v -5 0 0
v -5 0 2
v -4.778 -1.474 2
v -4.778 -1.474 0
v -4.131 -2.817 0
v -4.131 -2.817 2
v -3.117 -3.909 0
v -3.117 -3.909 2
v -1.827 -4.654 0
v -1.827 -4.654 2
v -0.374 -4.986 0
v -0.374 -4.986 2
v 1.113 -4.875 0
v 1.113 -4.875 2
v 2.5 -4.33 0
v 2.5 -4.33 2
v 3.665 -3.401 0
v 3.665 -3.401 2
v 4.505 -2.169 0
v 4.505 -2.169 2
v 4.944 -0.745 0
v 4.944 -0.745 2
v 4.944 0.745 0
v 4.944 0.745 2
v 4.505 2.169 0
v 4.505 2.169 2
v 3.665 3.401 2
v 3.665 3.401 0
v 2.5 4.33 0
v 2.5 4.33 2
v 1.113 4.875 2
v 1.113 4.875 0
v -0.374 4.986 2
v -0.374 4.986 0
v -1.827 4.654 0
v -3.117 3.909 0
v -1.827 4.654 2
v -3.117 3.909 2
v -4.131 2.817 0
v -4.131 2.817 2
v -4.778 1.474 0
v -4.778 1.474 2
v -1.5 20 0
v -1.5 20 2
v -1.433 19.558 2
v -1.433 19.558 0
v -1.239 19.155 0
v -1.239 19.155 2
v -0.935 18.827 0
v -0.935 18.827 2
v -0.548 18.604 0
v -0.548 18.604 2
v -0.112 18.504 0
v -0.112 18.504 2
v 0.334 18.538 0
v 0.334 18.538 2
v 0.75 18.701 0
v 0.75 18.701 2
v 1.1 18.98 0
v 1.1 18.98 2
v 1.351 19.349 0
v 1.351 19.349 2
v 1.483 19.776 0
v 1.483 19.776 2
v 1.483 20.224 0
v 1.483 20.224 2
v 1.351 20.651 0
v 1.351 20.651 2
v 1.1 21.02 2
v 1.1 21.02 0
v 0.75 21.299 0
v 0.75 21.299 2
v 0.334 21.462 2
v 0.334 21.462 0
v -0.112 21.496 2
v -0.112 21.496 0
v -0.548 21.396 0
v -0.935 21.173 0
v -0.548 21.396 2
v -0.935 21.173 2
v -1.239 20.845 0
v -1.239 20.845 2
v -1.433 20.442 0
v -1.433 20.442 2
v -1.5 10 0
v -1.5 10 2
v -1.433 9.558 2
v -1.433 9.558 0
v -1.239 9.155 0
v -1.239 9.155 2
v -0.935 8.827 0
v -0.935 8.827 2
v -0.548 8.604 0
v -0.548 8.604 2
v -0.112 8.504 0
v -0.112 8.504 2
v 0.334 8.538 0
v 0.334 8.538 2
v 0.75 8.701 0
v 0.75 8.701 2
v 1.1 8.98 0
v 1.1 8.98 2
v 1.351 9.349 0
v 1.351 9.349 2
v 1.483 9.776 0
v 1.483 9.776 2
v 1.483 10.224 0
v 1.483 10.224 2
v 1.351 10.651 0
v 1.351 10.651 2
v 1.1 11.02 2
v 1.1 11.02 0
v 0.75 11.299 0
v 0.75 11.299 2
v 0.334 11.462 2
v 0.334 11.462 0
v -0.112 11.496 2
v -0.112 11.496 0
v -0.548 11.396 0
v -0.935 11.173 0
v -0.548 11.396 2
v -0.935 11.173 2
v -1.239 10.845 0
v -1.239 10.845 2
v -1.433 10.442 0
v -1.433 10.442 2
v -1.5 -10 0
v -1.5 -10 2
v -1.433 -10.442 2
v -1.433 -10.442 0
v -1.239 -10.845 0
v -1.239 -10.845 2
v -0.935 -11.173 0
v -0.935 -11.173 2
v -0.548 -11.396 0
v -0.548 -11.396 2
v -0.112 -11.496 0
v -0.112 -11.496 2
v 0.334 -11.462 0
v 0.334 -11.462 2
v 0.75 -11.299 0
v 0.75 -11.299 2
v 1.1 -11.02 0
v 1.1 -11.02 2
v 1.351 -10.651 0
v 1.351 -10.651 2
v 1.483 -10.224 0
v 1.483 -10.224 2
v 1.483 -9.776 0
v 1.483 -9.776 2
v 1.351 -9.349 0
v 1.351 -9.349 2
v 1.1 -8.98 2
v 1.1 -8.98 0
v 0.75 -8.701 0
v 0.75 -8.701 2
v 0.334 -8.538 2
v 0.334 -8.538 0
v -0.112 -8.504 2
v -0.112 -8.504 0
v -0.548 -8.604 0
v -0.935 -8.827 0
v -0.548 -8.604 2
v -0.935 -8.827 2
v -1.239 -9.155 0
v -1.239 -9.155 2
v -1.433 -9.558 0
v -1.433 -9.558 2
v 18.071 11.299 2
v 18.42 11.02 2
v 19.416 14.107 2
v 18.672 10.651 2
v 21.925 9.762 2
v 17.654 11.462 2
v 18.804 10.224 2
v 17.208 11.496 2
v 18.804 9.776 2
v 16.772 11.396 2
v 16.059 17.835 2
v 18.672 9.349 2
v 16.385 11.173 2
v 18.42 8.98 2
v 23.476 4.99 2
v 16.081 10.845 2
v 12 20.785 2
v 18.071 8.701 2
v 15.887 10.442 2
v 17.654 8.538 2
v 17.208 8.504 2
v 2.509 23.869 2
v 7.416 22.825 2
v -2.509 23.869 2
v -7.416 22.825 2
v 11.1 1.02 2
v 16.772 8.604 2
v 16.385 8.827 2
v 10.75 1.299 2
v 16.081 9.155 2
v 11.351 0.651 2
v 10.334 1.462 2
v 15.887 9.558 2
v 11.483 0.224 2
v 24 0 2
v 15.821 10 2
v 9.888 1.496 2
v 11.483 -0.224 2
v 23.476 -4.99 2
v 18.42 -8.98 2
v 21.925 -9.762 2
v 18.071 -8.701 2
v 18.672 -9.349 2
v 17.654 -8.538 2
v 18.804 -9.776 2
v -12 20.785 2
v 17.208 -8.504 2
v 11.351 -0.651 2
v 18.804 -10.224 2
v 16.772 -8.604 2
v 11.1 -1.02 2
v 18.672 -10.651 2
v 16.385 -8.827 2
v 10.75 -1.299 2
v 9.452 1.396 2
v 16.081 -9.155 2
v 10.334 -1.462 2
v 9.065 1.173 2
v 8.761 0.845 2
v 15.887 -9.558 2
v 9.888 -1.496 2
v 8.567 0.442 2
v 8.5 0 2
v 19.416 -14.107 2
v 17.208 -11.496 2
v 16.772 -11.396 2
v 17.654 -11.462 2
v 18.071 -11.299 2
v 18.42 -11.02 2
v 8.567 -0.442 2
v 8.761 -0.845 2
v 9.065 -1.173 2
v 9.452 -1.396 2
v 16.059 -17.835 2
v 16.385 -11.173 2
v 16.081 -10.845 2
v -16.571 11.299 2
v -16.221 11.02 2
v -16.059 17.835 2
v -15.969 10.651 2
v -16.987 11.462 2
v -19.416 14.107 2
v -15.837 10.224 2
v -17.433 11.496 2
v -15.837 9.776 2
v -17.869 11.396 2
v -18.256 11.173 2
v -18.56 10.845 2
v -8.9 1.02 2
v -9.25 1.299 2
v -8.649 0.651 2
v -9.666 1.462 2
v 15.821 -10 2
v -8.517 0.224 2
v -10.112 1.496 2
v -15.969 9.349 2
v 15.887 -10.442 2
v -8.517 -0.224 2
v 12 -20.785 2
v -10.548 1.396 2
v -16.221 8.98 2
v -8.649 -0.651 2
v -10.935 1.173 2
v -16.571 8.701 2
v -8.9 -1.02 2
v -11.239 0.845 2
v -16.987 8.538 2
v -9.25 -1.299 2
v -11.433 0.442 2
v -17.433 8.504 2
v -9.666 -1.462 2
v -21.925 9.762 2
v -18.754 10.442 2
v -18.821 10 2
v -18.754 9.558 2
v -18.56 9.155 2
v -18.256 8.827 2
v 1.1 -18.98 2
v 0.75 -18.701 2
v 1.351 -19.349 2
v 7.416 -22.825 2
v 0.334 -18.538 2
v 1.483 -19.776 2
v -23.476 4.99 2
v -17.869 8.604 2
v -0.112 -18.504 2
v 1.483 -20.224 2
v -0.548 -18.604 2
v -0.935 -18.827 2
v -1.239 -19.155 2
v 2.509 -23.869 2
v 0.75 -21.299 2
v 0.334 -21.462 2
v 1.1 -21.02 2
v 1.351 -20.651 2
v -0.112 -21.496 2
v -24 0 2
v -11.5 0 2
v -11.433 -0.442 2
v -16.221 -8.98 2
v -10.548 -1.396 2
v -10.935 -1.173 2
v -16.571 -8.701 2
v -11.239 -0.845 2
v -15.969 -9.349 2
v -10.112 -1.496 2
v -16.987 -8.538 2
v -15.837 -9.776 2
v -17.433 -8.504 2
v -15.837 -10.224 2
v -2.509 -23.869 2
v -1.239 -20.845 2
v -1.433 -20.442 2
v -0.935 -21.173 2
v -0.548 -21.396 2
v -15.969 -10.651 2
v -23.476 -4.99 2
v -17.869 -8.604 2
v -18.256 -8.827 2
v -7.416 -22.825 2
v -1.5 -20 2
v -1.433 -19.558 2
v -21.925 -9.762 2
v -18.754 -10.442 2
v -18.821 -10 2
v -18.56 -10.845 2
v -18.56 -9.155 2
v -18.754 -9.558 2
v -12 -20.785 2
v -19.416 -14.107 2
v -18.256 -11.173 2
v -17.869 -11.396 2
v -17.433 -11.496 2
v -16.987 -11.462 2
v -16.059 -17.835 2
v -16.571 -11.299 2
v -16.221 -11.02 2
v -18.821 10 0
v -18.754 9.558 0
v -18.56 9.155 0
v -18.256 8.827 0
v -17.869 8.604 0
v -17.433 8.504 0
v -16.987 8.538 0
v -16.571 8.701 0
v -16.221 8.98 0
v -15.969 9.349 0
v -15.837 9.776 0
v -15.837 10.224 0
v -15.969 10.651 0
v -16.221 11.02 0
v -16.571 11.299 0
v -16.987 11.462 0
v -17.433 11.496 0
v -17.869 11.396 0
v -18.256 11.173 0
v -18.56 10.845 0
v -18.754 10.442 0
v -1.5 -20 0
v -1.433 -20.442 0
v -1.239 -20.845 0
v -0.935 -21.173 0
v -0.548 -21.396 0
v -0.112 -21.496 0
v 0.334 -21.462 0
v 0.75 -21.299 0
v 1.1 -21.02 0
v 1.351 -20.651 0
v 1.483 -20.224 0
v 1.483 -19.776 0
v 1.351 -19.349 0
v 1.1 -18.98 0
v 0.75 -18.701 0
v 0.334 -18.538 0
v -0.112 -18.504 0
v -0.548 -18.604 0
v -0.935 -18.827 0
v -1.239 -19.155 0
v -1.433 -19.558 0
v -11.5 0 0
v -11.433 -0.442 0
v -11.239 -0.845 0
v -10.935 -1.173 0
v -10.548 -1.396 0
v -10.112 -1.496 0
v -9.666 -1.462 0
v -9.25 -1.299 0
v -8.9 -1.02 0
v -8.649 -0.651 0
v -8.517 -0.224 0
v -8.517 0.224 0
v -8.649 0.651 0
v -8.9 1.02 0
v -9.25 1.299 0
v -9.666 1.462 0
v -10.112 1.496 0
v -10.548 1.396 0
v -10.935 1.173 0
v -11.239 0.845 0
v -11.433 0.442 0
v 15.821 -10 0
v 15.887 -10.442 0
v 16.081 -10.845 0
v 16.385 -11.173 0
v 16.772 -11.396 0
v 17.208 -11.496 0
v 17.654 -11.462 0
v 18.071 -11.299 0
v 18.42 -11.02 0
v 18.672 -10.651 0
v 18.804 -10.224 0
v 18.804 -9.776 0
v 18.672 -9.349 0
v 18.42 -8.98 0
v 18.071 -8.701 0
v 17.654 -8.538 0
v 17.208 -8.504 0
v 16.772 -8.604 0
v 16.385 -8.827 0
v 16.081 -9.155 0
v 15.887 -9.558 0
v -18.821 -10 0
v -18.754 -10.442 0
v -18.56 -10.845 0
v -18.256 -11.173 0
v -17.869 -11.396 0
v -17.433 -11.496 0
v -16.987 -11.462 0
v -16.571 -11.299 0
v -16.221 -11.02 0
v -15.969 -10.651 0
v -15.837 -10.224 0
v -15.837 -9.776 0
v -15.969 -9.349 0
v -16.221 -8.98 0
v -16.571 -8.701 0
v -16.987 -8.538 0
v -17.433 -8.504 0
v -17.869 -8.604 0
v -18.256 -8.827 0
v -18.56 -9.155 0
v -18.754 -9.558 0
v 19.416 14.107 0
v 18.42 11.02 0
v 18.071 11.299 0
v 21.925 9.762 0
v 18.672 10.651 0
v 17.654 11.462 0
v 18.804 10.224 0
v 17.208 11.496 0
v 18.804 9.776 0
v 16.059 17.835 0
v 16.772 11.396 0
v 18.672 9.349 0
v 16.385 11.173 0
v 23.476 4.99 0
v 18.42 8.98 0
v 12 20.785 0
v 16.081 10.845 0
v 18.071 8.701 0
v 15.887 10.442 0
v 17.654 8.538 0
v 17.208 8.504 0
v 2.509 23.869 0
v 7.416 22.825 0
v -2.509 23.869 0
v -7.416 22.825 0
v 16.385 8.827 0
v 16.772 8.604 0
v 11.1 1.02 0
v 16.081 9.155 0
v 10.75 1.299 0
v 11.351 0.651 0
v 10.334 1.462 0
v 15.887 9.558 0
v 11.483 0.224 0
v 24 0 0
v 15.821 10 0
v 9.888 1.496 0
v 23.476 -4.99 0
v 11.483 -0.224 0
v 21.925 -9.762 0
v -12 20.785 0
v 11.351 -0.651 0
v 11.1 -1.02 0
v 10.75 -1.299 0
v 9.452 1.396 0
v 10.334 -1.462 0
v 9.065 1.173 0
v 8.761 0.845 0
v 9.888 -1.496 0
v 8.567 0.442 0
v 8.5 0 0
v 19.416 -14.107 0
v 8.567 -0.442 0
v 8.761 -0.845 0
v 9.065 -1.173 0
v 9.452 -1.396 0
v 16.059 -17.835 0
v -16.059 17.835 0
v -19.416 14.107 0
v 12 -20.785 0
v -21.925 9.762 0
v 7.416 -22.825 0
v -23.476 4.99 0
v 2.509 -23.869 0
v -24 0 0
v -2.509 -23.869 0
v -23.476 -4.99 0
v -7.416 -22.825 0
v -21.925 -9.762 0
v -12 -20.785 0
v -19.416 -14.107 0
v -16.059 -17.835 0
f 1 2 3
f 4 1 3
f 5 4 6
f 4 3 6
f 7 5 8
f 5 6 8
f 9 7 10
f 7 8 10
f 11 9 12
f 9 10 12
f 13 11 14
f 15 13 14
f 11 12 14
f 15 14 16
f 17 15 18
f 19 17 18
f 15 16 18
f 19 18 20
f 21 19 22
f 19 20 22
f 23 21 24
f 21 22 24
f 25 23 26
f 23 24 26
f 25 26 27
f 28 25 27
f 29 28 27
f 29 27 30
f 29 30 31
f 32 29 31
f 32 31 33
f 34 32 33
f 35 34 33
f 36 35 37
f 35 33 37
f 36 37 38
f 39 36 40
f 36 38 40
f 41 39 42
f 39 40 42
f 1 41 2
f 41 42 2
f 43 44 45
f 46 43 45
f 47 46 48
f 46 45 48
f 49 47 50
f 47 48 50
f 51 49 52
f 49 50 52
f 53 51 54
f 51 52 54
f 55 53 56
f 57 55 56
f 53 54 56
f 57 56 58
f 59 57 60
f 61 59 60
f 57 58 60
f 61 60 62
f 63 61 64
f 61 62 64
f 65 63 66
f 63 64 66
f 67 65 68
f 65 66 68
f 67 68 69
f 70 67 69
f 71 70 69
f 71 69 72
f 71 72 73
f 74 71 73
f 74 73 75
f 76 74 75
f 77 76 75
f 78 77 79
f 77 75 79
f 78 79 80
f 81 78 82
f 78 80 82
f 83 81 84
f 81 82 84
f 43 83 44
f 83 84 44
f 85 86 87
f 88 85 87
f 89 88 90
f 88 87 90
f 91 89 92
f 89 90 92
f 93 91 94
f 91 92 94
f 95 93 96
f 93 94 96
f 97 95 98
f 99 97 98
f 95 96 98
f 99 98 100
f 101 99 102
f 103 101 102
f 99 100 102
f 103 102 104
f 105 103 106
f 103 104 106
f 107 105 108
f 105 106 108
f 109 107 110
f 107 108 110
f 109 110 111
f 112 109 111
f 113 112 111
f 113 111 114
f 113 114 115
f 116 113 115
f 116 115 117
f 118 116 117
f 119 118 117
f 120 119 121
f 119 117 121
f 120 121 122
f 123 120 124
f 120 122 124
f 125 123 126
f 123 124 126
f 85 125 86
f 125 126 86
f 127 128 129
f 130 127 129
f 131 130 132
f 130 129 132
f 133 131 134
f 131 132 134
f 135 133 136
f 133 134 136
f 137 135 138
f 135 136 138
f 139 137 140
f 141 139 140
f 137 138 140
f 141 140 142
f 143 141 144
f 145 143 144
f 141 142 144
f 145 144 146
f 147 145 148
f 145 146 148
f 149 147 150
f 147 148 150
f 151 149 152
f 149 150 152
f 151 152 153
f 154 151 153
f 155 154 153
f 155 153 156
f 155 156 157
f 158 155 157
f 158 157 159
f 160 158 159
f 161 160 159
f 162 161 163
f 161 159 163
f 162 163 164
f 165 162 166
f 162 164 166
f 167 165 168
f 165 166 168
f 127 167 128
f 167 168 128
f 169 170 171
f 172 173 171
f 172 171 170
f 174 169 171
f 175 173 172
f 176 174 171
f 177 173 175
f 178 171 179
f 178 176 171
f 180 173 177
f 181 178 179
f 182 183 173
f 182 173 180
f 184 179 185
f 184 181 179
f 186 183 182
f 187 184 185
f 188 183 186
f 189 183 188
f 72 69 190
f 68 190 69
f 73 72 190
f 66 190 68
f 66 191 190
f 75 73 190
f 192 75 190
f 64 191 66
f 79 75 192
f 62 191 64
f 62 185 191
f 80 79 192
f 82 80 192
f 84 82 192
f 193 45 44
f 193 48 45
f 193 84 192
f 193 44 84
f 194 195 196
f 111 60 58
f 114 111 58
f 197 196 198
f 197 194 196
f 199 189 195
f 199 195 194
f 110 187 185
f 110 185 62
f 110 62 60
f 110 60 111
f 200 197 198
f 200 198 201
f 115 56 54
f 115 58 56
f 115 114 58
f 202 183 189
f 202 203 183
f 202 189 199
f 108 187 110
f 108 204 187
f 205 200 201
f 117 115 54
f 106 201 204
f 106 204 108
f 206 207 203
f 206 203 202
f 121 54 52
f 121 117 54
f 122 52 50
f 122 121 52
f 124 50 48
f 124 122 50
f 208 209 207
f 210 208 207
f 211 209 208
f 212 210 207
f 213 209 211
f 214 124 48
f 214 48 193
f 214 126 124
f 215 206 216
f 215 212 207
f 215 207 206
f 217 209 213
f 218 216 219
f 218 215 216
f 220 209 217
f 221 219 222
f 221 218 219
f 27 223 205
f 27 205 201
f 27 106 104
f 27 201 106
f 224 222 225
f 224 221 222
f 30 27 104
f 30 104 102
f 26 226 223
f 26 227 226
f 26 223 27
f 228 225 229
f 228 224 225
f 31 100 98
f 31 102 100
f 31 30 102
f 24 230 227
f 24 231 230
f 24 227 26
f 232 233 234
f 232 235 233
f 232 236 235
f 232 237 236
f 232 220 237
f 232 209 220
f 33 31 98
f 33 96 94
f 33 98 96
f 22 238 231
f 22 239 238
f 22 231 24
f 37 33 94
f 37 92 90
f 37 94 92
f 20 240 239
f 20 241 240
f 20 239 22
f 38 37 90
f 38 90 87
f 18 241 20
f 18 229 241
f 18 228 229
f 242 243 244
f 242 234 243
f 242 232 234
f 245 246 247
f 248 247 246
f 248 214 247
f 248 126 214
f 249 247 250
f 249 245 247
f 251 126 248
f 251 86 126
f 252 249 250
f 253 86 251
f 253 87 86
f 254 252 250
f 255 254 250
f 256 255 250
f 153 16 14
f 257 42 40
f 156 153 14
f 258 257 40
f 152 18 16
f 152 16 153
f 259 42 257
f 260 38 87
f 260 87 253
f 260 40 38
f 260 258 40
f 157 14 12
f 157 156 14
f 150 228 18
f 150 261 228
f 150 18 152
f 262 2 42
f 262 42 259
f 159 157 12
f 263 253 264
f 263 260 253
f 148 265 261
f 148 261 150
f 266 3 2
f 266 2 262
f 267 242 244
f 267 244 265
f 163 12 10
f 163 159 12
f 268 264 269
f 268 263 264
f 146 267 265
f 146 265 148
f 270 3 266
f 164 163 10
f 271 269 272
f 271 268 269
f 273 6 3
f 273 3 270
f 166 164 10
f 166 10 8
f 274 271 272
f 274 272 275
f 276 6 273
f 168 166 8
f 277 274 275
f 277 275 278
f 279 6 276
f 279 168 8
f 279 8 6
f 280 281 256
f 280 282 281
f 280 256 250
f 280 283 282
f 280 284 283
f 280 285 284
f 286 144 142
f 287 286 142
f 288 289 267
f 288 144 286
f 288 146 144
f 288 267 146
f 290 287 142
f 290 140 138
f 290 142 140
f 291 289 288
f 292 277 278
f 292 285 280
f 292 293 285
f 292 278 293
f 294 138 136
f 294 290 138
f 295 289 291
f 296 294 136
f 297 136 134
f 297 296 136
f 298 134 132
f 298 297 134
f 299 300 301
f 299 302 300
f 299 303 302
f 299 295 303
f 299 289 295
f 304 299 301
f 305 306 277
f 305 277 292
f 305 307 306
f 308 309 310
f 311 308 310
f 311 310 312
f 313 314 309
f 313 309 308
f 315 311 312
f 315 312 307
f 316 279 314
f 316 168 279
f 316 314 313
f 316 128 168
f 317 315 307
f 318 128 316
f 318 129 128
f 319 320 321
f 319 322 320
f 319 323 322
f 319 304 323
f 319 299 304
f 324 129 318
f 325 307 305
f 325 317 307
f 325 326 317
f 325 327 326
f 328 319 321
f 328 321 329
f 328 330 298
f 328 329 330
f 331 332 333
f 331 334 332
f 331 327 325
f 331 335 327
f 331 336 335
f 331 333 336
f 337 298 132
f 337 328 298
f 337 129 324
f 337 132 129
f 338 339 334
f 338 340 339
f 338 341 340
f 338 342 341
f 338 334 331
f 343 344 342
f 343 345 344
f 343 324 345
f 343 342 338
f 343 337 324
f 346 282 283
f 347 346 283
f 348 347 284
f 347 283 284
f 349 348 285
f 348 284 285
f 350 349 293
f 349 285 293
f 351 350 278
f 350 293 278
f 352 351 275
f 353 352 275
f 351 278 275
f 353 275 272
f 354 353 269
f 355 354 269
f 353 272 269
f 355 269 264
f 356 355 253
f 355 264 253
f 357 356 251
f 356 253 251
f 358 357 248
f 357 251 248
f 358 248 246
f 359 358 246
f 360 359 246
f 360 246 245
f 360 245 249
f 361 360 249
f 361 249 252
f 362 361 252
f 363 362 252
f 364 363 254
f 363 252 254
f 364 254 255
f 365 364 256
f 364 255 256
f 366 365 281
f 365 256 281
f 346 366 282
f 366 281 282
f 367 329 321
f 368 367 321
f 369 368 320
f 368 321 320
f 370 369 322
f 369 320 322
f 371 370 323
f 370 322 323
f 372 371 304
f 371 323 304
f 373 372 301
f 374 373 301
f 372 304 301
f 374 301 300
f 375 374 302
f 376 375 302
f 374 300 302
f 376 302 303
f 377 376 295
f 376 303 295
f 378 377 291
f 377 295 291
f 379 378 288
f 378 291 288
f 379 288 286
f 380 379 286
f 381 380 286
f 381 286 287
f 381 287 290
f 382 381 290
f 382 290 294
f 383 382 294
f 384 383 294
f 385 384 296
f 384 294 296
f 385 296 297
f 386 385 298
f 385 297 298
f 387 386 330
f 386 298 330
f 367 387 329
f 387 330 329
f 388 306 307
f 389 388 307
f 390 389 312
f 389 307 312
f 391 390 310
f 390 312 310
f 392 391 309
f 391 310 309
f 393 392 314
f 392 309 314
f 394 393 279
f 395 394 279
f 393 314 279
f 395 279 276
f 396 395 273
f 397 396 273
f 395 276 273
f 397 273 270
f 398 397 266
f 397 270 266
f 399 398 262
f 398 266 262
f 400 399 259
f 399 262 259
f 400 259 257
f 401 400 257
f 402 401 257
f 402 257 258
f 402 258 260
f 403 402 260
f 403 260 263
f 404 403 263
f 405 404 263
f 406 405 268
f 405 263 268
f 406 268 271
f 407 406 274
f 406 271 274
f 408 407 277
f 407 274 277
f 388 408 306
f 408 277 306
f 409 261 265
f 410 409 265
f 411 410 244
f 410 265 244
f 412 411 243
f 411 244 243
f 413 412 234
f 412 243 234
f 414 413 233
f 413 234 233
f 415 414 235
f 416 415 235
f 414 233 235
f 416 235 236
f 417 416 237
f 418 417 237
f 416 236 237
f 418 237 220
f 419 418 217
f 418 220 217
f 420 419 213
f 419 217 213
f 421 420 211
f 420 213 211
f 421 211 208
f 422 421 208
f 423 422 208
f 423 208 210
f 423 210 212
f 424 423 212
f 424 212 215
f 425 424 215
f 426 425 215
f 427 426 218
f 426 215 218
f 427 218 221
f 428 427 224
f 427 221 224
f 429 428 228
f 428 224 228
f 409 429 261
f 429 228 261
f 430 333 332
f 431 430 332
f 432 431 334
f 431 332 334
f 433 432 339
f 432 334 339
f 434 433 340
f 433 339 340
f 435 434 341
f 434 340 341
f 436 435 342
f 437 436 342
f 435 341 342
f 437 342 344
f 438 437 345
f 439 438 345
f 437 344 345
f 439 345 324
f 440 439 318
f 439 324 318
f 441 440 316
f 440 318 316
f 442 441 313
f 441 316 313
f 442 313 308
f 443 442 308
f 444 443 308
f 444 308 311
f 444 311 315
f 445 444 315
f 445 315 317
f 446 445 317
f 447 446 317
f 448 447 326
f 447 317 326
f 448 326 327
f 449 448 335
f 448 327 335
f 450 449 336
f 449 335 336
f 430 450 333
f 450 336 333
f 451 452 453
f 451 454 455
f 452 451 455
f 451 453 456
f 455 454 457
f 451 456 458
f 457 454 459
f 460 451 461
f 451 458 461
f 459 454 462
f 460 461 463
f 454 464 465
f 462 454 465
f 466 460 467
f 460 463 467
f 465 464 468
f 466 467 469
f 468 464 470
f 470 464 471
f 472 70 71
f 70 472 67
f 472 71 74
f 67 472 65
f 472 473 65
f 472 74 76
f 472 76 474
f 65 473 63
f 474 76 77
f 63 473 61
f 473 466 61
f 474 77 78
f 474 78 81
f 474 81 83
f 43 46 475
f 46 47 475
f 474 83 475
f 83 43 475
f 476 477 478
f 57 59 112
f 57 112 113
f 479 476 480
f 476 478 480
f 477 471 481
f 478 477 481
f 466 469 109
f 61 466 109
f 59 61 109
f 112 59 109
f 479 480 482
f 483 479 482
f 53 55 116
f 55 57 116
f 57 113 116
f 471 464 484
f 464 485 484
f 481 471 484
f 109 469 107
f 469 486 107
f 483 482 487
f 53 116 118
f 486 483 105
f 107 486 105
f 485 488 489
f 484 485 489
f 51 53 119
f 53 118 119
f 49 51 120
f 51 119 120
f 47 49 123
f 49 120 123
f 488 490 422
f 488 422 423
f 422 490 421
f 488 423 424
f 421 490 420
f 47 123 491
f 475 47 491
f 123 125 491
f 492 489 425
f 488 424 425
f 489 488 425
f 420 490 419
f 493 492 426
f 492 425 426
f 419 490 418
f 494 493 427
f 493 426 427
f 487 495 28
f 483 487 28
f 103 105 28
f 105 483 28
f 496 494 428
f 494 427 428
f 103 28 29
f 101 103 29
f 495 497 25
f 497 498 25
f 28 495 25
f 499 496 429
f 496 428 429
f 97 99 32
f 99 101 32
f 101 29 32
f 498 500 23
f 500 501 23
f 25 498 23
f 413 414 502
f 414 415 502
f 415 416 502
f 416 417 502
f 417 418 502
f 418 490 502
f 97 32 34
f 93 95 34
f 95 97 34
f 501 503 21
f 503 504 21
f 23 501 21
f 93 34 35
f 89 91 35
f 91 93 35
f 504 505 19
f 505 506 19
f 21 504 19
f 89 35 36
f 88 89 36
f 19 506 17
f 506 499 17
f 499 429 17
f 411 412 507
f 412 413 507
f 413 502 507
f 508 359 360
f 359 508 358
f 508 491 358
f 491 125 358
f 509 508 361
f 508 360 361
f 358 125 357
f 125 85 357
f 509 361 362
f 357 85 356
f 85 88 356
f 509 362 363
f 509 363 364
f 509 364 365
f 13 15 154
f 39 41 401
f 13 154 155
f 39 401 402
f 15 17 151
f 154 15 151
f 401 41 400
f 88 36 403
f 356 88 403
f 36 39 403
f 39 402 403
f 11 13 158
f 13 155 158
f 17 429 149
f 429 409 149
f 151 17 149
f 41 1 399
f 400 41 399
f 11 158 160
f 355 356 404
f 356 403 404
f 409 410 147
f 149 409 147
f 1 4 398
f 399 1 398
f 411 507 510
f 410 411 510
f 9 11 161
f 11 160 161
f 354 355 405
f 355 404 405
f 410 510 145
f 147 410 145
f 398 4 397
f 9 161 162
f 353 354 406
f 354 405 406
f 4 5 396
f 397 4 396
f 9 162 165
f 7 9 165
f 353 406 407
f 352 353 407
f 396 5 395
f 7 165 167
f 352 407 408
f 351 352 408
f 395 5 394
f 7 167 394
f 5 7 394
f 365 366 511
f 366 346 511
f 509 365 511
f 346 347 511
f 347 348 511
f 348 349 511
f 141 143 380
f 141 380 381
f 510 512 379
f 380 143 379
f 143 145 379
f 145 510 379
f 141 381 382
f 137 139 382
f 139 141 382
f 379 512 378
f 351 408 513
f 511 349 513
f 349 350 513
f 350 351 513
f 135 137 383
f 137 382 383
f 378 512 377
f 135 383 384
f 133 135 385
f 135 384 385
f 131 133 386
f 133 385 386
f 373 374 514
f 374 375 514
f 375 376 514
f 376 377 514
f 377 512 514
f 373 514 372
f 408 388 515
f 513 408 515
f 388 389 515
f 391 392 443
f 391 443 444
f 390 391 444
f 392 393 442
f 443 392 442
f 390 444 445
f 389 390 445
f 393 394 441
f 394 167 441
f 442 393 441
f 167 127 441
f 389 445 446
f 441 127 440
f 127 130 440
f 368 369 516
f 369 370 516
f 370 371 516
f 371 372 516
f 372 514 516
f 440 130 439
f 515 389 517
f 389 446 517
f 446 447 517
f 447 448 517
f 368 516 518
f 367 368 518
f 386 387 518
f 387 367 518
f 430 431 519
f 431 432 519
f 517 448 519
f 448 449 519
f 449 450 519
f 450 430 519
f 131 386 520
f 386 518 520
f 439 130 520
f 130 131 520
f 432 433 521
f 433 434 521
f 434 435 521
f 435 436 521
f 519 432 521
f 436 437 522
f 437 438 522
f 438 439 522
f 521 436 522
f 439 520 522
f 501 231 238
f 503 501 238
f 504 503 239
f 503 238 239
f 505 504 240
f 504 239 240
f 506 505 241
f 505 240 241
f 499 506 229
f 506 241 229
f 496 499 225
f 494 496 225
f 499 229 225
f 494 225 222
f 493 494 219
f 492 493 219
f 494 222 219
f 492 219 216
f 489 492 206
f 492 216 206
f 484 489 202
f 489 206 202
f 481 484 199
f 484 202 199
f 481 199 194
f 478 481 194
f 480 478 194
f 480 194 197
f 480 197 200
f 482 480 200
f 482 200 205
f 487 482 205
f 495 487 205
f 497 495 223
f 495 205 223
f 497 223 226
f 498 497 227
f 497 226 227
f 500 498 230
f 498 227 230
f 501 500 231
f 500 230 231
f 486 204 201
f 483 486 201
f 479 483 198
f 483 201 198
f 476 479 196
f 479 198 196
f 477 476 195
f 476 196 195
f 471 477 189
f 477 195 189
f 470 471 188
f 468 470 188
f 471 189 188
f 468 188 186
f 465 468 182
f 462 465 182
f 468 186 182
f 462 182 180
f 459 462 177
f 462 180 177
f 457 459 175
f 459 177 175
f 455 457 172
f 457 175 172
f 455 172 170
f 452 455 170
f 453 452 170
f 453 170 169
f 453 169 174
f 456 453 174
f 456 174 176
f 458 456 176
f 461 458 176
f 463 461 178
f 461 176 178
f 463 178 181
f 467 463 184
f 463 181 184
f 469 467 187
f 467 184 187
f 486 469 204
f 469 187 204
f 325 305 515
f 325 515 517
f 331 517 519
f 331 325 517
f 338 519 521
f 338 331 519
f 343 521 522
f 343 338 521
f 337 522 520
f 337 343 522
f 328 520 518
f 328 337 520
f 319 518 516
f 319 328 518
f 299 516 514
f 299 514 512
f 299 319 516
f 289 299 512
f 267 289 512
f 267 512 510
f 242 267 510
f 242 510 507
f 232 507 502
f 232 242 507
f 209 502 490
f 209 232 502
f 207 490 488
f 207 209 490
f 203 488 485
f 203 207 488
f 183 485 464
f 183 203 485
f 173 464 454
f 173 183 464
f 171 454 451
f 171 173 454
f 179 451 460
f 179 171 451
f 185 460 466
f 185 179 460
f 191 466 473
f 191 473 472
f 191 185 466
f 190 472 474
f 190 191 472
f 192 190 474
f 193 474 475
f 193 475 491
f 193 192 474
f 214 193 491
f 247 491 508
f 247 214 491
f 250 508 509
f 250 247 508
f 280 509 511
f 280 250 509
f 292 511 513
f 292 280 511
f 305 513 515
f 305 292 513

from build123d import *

# Parameters (mm, degrees)
SKETCH_1_R      = 24
SKETCH_1_R_2    = 1.5
SKETCH_1_R_3    = 5
EXTRUDE_1_DEPTH = 2


with BuildPart() as part:
    # 草图1 → 凸台-拉伸1 (new body)
    with BuildSketch(Plane.XY.offset(2)):
        with Locations(Location((0, 0, 0), (0, 0, 180))):
            Circle(SKETCH_1_R)
        with Locations(Location((-17.320508076, 10, 0), (0, 0, 180))):
            Circle(SKETCH_1_R_2, mode=Mode.SUBTRACT)
        with Locations(Location((0, -20, 0), (0, 0, 180))):
            Circle(SKETCH_1_R_2, mode=Mode.SUBTRACT)
        with Locations(Location((17.320508076, 10, 0), (0, 0, 180))):
            Circle(SKETCH_1_R_2, mode=Mode.SUBTRACT)
        with Locations(Location((0, 0, 0), (0, 0, 180))):
            Circle(SKETCH_1_R_3, mode=Mode.SUBTRACT)
        with Locations(Location((0, 20, 0), (0, 0, 180))):
            Circle(SKETCH_1_R_2, mode=Mode.SUBTRACT)
        with Locations(Location((17.320508076, -10, 0), (0, 0, 180))):
            Circle(SKETCH_1_R_2, mode=Mode.SUBTRACT)
        with Locations(Location((-17.320508076, -10, 0), (0, 0, 180))):
            Circle(SKETCH_1_R_2, mode=Mode.SUBTRACT)
        with Locations(Location((0, 10, 0), (0, 0, 180))):
            Circle(SKETCH_1_R_2, mode=Mode.SUBTRACT)
        with Locations(Location((-10, 0, 0), (0, 0, 180))):
            Circle(SKETCH_1_R_2, mode=Mode.SUBTRACT)
        with Locations(Location((0, -10, 0), (0, 0, 180))):
            Circle(SKETCH_1_R_2, mode=Mode.SUBTRACT)
        with Locations(Location((10, 0, 0), (0, 0, 180))):
            Circle(SKETCH_1_R_2, mode=Mode.SUBTRACT)
    extrude(amount=-EXTRUDE_1_DEPTH)


solid = part.part
